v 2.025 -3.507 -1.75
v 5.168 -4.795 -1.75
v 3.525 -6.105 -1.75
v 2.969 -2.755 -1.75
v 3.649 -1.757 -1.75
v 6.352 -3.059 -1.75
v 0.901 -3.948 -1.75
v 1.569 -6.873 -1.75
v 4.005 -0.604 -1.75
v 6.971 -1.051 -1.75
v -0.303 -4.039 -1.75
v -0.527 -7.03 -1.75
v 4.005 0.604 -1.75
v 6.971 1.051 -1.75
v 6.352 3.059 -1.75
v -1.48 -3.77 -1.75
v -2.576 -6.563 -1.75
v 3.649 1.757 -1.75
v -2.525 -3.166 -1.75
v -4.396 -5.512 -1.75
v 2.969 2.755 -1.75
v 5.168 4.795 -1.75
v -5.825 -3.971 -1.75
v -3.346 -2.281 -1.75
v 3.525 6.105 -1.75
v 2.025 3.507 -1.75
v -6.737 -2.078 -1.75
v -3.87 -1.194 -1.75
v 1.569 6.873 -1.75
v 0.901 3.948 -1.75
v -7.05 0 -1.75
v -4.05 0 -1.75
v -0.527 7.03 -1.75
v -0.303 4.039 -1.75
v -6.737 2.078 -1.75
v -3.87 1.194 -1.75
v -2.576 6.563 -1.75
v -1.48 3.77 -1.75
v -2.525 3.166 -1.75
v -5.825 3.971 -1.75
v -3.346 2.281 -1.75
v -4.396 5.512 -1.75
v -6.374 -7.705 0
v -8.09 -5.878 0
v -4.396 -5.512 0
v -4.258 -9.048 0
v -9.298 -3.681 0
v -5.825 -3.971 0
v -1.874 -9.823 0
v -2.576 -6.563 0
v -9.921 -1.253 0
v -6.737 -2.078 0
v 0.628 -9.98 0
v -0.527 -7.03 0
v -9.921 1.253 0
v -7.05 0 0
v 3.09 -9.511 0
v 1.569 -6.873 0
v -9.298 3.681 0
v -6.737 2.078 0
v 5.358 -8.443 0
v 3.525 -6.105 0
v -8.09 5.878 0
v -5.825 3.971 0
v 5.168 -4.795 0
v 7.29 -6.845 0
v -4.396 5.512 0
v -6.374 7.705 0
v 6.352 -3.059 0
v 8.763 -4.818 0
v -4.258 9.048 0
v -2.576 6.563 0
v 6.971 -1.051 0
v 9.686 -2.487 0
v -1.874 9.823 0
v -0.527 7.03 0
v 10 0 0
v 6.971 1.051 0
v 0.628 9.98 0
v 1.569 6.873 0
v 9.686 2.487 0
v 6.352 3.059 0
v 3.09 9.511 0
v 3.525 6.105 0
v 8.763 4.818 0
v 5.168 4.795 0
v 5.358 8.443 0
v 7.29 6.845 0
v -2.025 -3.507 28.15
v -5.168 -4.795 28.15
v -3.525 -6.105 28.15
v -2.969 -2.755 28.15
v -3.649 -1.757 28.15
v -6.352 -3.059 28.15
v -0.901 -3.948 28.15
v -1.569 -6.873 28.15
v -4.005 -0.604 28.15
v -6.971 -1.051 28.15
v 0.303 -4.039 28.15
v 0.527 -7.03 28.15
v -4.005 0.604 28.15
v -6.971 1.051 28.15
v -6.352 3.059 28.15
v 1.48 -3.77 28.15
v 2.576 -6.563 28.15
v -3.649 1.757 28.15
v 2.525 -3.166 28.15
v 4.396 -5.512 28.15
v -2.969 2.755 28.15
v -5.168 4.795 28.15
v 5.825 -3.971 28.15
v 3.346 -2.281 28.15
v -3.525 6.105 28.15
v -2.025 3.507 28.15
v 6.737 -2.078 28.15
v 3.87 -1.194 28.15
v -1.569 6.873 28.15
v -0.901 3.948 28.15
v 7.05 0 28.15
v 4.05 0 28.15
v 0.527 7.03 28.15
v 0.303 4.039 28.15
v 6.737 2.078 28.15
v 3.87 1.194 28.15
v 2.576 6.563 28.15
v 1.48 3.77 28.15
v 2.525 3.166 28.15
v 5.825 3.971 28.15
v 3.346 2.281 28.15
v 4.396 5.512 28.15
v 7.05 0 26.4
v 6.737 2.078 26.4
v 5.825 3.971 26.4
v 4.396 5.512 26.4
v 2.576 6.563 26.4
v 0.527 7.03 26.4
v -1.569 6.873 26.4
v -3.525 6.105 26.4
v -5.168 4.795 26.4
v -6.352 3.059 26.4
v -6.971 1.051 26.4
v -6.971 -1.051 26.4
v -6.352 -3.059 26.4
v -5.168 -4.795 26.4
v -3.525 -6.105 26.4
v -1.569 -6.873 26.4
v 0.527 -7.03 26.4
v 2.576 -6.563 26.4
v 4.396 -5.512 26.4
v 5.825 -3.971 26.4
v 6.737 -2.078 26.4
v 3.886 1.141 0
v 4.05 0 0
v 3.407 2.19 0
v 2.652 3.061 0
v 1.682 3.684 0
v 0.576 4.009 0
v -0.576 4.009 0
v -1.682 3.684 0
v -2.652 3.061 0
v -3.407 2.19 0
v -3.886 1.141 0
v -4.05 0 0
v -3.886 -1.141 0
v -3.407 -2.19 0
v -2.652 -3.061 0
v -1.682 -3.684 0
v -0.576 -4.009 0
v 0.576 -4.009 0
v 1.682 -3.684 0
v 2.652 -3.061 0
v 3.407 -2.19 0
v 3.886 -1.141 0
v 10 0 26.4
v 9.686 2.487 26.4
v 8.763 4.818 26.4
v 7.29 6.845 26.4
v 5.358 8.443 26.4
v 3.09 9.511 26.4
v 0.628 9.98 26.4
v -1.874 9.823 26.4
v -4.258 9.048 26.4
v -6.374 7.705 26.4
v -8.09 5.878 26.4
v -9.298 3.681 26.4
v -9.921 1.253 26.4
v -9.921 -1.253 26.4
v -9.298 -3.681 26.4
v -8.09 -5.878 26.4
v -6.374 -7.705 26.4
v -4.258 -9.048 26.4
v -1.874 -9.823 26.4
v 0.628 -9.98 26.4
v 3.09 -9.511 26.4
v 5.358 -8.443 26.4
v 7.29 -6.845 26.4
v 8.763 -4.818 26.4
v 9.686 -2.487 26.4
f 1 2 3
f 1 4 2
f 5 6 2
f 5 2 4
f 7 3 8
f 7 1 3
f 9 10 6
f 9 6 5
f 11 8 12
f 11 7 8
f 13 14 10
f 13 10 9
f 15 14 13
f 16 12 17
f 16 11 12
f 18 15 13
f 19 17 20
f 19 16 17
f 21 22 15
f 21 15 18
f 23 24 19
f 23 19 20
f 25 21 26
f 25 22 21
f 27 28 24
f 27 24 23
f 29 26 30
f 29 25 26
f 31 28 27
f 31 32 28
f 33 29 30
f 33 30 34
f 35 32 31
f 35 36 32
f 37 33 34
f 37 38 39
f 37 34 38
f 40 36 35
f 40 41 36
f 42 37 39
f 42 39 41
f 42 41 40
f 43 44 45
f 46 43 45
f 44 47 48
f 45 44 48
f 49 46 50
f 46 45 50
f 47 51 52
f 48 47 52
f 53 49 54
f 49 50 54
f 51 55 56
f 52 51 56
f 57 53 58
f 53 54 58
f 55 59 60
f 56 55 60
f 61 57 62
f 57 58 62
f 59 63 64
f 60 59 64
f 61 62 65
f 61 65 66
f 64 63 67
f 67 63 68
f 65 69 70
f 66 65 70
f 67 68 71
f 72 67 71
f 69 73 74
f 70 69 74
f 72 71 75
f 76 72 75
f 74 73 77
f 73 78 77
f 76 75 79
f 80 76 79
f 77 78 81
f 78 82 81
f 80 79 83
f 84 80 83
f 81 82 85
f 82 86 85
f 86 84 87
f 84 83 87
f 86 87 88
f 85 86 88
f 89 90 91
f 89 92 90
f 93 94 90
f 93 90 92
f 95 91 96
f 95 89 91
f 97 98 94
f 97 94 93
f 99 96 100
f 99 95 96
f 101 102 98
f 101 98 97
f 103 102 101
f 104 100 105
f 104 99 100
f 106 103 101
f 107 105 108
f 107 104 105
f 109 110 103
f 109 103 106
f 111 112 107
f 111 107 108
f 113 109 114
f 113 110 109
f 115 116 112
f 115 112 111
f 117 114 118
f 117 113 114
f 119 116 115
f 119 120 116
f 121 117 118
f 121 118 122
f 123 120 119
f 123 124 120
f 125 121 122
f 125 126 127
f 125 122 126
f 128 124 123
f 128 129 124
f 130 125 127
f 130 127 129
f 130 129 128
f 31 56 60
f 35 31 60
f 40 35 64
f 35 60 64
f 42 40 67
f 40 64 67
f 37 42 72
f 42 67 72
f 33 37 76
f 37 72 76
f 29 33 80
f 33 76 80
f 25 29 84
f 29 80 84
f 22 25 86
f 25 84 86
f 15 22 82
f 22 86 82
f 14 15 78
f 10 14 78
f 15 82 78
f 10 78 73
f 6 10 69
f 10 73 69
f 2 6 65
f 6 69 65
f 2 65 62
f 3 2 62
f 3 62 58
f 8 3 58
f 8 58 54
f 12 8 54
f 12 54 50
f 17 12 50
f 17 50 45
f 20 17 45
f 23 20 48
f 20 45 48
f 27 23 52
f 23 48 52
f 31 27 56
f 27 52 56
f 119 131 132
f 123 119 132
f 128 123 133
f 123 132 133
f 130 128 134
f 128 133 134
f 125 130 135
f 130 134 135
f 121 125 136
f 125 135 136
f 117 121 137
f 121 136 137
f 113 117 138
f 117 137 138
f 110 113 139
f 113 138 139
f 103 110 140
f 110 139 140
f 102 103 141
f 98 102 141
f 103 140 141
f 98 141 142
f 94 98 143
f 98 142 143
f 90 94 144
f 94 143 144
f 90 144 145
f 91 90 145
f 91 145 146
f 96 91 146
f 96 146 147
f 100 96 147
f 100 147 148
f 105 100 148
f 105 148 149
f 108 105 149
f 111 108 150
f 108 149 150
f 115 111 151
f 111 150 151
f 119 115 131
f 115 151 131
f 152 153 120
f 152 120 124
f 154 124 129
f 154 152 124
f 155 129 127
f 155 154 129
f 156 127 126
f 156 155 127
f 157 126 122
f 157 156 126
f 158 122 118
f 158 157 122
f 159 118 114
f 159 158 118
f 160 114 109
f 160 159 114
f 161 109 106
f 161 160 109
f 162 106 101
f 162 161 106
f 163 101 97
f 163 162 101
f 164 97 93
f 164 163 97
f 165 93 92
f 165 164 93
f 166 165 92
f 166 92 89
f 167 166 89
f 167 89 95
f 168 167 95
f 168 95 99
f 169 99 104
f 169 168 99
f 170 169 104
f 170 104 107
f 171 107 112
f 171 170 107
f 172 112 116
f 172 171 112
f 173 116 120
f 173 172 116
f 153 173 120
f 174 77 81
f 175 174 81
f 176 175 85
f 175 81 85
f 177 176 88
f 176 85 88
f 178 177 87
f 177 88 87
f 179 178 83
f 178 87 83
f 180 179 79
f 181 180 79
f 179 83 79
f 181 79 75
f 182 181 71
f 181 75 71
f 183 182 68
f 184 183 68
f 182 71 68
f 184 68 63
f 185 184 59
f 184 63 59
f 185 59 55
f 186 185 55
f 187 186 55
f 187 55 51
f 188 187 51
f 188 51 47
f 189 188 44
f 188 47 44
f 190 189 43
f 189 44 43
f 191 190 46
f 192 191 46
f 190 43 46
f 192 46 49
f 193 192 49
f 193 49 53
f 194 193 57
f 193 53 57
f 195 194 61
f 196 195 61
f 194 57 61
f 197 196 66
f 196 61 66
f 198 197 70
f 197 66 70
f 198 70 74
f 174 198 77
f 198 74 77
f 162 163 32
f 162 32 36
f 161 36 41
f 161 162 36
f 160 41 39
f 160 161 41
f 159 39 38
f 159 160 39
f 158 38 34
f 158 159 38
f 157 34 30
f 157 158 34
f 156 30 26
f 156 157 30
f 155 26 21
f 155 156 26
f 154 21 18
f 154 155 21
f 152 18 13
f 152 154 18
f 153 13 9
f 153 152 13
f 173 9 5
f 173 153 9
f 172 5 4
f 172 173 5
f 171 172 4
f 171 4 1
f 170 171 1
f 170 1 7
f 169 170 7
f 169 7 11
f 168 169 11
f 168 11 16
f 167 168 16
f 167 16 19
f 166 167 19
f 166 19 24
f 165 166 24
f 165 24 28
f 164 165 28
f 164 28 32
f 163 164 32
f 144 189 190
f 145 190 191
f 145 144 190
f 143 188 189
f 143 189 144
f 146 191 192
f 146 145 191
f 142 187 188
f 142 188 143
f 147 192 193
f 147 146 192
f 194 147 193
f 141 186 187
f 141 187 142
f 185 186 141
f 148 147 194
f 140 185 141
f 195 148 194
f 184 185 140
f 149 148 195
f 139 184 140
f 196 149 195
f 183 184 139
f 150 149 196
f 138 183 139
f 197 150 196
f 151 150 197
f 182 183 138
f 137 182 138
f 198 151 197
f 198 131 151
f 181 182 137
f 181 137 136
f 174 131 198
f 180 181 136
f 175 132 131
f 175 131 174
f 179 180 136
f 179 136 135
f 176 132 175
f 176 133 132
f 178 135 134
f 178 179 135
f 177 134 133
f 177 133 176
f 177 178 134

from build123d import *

# Parameters (mm, degrees)
CROQUIS1_R              = 10
CROQUIS1_R_2            = 4.05
SALIENTE_EXTRUIR1_DEPTH = 26.4
CROQUIS2_R              = 7.05
CROQUIS2_R_2            = 4.05
SALIENTE_EXTRUIR2_DEPTH = 1.75
CROQUIS3_R              = 7.05
CROQUIS3_R_2            = 4.05
SALIENTE_EXTRUIR3_DEPTH = 1.75


with BuildPart() as part:
    # Croquis1 → Saliente-Extruir1 (new body)
    with BuildSketch(Plane.XY):
        Circle(CROQUIS1_R)
        Circle(CROQUIS1_R_2, mode=Mode.SUBTRACT)
    extrude(amount=SALIENTE_EXTRUIR1_DEPTH)

    # Croquis2 → Saliente-Extruir2 (add)
    with BuildSketch(Plane.XY.offset(26.4)):
        Circle(CROQUIS2_R)
        Circle(CROQUIS2_R_2, mode=Mode.SUBTRACT)
    extrude(amount=SALIENTE_EXTRUIR2_DEPTH)

    # Croquis3 → Saliente-Extruir3 (add)
    with BuildSketch(Plane(origin=(0, 0, 0), x_dir=(-1, 0, 0), z_dir=(0, 0, -1))):
        Circle(CROQUIS3_R)
        Circle(CROQUIS3_R_2, mode=Mode.SUBTRACT)
    extrude(amount=SALIENTE_EXTRUIR3_DEPTH)


solid = part.part
